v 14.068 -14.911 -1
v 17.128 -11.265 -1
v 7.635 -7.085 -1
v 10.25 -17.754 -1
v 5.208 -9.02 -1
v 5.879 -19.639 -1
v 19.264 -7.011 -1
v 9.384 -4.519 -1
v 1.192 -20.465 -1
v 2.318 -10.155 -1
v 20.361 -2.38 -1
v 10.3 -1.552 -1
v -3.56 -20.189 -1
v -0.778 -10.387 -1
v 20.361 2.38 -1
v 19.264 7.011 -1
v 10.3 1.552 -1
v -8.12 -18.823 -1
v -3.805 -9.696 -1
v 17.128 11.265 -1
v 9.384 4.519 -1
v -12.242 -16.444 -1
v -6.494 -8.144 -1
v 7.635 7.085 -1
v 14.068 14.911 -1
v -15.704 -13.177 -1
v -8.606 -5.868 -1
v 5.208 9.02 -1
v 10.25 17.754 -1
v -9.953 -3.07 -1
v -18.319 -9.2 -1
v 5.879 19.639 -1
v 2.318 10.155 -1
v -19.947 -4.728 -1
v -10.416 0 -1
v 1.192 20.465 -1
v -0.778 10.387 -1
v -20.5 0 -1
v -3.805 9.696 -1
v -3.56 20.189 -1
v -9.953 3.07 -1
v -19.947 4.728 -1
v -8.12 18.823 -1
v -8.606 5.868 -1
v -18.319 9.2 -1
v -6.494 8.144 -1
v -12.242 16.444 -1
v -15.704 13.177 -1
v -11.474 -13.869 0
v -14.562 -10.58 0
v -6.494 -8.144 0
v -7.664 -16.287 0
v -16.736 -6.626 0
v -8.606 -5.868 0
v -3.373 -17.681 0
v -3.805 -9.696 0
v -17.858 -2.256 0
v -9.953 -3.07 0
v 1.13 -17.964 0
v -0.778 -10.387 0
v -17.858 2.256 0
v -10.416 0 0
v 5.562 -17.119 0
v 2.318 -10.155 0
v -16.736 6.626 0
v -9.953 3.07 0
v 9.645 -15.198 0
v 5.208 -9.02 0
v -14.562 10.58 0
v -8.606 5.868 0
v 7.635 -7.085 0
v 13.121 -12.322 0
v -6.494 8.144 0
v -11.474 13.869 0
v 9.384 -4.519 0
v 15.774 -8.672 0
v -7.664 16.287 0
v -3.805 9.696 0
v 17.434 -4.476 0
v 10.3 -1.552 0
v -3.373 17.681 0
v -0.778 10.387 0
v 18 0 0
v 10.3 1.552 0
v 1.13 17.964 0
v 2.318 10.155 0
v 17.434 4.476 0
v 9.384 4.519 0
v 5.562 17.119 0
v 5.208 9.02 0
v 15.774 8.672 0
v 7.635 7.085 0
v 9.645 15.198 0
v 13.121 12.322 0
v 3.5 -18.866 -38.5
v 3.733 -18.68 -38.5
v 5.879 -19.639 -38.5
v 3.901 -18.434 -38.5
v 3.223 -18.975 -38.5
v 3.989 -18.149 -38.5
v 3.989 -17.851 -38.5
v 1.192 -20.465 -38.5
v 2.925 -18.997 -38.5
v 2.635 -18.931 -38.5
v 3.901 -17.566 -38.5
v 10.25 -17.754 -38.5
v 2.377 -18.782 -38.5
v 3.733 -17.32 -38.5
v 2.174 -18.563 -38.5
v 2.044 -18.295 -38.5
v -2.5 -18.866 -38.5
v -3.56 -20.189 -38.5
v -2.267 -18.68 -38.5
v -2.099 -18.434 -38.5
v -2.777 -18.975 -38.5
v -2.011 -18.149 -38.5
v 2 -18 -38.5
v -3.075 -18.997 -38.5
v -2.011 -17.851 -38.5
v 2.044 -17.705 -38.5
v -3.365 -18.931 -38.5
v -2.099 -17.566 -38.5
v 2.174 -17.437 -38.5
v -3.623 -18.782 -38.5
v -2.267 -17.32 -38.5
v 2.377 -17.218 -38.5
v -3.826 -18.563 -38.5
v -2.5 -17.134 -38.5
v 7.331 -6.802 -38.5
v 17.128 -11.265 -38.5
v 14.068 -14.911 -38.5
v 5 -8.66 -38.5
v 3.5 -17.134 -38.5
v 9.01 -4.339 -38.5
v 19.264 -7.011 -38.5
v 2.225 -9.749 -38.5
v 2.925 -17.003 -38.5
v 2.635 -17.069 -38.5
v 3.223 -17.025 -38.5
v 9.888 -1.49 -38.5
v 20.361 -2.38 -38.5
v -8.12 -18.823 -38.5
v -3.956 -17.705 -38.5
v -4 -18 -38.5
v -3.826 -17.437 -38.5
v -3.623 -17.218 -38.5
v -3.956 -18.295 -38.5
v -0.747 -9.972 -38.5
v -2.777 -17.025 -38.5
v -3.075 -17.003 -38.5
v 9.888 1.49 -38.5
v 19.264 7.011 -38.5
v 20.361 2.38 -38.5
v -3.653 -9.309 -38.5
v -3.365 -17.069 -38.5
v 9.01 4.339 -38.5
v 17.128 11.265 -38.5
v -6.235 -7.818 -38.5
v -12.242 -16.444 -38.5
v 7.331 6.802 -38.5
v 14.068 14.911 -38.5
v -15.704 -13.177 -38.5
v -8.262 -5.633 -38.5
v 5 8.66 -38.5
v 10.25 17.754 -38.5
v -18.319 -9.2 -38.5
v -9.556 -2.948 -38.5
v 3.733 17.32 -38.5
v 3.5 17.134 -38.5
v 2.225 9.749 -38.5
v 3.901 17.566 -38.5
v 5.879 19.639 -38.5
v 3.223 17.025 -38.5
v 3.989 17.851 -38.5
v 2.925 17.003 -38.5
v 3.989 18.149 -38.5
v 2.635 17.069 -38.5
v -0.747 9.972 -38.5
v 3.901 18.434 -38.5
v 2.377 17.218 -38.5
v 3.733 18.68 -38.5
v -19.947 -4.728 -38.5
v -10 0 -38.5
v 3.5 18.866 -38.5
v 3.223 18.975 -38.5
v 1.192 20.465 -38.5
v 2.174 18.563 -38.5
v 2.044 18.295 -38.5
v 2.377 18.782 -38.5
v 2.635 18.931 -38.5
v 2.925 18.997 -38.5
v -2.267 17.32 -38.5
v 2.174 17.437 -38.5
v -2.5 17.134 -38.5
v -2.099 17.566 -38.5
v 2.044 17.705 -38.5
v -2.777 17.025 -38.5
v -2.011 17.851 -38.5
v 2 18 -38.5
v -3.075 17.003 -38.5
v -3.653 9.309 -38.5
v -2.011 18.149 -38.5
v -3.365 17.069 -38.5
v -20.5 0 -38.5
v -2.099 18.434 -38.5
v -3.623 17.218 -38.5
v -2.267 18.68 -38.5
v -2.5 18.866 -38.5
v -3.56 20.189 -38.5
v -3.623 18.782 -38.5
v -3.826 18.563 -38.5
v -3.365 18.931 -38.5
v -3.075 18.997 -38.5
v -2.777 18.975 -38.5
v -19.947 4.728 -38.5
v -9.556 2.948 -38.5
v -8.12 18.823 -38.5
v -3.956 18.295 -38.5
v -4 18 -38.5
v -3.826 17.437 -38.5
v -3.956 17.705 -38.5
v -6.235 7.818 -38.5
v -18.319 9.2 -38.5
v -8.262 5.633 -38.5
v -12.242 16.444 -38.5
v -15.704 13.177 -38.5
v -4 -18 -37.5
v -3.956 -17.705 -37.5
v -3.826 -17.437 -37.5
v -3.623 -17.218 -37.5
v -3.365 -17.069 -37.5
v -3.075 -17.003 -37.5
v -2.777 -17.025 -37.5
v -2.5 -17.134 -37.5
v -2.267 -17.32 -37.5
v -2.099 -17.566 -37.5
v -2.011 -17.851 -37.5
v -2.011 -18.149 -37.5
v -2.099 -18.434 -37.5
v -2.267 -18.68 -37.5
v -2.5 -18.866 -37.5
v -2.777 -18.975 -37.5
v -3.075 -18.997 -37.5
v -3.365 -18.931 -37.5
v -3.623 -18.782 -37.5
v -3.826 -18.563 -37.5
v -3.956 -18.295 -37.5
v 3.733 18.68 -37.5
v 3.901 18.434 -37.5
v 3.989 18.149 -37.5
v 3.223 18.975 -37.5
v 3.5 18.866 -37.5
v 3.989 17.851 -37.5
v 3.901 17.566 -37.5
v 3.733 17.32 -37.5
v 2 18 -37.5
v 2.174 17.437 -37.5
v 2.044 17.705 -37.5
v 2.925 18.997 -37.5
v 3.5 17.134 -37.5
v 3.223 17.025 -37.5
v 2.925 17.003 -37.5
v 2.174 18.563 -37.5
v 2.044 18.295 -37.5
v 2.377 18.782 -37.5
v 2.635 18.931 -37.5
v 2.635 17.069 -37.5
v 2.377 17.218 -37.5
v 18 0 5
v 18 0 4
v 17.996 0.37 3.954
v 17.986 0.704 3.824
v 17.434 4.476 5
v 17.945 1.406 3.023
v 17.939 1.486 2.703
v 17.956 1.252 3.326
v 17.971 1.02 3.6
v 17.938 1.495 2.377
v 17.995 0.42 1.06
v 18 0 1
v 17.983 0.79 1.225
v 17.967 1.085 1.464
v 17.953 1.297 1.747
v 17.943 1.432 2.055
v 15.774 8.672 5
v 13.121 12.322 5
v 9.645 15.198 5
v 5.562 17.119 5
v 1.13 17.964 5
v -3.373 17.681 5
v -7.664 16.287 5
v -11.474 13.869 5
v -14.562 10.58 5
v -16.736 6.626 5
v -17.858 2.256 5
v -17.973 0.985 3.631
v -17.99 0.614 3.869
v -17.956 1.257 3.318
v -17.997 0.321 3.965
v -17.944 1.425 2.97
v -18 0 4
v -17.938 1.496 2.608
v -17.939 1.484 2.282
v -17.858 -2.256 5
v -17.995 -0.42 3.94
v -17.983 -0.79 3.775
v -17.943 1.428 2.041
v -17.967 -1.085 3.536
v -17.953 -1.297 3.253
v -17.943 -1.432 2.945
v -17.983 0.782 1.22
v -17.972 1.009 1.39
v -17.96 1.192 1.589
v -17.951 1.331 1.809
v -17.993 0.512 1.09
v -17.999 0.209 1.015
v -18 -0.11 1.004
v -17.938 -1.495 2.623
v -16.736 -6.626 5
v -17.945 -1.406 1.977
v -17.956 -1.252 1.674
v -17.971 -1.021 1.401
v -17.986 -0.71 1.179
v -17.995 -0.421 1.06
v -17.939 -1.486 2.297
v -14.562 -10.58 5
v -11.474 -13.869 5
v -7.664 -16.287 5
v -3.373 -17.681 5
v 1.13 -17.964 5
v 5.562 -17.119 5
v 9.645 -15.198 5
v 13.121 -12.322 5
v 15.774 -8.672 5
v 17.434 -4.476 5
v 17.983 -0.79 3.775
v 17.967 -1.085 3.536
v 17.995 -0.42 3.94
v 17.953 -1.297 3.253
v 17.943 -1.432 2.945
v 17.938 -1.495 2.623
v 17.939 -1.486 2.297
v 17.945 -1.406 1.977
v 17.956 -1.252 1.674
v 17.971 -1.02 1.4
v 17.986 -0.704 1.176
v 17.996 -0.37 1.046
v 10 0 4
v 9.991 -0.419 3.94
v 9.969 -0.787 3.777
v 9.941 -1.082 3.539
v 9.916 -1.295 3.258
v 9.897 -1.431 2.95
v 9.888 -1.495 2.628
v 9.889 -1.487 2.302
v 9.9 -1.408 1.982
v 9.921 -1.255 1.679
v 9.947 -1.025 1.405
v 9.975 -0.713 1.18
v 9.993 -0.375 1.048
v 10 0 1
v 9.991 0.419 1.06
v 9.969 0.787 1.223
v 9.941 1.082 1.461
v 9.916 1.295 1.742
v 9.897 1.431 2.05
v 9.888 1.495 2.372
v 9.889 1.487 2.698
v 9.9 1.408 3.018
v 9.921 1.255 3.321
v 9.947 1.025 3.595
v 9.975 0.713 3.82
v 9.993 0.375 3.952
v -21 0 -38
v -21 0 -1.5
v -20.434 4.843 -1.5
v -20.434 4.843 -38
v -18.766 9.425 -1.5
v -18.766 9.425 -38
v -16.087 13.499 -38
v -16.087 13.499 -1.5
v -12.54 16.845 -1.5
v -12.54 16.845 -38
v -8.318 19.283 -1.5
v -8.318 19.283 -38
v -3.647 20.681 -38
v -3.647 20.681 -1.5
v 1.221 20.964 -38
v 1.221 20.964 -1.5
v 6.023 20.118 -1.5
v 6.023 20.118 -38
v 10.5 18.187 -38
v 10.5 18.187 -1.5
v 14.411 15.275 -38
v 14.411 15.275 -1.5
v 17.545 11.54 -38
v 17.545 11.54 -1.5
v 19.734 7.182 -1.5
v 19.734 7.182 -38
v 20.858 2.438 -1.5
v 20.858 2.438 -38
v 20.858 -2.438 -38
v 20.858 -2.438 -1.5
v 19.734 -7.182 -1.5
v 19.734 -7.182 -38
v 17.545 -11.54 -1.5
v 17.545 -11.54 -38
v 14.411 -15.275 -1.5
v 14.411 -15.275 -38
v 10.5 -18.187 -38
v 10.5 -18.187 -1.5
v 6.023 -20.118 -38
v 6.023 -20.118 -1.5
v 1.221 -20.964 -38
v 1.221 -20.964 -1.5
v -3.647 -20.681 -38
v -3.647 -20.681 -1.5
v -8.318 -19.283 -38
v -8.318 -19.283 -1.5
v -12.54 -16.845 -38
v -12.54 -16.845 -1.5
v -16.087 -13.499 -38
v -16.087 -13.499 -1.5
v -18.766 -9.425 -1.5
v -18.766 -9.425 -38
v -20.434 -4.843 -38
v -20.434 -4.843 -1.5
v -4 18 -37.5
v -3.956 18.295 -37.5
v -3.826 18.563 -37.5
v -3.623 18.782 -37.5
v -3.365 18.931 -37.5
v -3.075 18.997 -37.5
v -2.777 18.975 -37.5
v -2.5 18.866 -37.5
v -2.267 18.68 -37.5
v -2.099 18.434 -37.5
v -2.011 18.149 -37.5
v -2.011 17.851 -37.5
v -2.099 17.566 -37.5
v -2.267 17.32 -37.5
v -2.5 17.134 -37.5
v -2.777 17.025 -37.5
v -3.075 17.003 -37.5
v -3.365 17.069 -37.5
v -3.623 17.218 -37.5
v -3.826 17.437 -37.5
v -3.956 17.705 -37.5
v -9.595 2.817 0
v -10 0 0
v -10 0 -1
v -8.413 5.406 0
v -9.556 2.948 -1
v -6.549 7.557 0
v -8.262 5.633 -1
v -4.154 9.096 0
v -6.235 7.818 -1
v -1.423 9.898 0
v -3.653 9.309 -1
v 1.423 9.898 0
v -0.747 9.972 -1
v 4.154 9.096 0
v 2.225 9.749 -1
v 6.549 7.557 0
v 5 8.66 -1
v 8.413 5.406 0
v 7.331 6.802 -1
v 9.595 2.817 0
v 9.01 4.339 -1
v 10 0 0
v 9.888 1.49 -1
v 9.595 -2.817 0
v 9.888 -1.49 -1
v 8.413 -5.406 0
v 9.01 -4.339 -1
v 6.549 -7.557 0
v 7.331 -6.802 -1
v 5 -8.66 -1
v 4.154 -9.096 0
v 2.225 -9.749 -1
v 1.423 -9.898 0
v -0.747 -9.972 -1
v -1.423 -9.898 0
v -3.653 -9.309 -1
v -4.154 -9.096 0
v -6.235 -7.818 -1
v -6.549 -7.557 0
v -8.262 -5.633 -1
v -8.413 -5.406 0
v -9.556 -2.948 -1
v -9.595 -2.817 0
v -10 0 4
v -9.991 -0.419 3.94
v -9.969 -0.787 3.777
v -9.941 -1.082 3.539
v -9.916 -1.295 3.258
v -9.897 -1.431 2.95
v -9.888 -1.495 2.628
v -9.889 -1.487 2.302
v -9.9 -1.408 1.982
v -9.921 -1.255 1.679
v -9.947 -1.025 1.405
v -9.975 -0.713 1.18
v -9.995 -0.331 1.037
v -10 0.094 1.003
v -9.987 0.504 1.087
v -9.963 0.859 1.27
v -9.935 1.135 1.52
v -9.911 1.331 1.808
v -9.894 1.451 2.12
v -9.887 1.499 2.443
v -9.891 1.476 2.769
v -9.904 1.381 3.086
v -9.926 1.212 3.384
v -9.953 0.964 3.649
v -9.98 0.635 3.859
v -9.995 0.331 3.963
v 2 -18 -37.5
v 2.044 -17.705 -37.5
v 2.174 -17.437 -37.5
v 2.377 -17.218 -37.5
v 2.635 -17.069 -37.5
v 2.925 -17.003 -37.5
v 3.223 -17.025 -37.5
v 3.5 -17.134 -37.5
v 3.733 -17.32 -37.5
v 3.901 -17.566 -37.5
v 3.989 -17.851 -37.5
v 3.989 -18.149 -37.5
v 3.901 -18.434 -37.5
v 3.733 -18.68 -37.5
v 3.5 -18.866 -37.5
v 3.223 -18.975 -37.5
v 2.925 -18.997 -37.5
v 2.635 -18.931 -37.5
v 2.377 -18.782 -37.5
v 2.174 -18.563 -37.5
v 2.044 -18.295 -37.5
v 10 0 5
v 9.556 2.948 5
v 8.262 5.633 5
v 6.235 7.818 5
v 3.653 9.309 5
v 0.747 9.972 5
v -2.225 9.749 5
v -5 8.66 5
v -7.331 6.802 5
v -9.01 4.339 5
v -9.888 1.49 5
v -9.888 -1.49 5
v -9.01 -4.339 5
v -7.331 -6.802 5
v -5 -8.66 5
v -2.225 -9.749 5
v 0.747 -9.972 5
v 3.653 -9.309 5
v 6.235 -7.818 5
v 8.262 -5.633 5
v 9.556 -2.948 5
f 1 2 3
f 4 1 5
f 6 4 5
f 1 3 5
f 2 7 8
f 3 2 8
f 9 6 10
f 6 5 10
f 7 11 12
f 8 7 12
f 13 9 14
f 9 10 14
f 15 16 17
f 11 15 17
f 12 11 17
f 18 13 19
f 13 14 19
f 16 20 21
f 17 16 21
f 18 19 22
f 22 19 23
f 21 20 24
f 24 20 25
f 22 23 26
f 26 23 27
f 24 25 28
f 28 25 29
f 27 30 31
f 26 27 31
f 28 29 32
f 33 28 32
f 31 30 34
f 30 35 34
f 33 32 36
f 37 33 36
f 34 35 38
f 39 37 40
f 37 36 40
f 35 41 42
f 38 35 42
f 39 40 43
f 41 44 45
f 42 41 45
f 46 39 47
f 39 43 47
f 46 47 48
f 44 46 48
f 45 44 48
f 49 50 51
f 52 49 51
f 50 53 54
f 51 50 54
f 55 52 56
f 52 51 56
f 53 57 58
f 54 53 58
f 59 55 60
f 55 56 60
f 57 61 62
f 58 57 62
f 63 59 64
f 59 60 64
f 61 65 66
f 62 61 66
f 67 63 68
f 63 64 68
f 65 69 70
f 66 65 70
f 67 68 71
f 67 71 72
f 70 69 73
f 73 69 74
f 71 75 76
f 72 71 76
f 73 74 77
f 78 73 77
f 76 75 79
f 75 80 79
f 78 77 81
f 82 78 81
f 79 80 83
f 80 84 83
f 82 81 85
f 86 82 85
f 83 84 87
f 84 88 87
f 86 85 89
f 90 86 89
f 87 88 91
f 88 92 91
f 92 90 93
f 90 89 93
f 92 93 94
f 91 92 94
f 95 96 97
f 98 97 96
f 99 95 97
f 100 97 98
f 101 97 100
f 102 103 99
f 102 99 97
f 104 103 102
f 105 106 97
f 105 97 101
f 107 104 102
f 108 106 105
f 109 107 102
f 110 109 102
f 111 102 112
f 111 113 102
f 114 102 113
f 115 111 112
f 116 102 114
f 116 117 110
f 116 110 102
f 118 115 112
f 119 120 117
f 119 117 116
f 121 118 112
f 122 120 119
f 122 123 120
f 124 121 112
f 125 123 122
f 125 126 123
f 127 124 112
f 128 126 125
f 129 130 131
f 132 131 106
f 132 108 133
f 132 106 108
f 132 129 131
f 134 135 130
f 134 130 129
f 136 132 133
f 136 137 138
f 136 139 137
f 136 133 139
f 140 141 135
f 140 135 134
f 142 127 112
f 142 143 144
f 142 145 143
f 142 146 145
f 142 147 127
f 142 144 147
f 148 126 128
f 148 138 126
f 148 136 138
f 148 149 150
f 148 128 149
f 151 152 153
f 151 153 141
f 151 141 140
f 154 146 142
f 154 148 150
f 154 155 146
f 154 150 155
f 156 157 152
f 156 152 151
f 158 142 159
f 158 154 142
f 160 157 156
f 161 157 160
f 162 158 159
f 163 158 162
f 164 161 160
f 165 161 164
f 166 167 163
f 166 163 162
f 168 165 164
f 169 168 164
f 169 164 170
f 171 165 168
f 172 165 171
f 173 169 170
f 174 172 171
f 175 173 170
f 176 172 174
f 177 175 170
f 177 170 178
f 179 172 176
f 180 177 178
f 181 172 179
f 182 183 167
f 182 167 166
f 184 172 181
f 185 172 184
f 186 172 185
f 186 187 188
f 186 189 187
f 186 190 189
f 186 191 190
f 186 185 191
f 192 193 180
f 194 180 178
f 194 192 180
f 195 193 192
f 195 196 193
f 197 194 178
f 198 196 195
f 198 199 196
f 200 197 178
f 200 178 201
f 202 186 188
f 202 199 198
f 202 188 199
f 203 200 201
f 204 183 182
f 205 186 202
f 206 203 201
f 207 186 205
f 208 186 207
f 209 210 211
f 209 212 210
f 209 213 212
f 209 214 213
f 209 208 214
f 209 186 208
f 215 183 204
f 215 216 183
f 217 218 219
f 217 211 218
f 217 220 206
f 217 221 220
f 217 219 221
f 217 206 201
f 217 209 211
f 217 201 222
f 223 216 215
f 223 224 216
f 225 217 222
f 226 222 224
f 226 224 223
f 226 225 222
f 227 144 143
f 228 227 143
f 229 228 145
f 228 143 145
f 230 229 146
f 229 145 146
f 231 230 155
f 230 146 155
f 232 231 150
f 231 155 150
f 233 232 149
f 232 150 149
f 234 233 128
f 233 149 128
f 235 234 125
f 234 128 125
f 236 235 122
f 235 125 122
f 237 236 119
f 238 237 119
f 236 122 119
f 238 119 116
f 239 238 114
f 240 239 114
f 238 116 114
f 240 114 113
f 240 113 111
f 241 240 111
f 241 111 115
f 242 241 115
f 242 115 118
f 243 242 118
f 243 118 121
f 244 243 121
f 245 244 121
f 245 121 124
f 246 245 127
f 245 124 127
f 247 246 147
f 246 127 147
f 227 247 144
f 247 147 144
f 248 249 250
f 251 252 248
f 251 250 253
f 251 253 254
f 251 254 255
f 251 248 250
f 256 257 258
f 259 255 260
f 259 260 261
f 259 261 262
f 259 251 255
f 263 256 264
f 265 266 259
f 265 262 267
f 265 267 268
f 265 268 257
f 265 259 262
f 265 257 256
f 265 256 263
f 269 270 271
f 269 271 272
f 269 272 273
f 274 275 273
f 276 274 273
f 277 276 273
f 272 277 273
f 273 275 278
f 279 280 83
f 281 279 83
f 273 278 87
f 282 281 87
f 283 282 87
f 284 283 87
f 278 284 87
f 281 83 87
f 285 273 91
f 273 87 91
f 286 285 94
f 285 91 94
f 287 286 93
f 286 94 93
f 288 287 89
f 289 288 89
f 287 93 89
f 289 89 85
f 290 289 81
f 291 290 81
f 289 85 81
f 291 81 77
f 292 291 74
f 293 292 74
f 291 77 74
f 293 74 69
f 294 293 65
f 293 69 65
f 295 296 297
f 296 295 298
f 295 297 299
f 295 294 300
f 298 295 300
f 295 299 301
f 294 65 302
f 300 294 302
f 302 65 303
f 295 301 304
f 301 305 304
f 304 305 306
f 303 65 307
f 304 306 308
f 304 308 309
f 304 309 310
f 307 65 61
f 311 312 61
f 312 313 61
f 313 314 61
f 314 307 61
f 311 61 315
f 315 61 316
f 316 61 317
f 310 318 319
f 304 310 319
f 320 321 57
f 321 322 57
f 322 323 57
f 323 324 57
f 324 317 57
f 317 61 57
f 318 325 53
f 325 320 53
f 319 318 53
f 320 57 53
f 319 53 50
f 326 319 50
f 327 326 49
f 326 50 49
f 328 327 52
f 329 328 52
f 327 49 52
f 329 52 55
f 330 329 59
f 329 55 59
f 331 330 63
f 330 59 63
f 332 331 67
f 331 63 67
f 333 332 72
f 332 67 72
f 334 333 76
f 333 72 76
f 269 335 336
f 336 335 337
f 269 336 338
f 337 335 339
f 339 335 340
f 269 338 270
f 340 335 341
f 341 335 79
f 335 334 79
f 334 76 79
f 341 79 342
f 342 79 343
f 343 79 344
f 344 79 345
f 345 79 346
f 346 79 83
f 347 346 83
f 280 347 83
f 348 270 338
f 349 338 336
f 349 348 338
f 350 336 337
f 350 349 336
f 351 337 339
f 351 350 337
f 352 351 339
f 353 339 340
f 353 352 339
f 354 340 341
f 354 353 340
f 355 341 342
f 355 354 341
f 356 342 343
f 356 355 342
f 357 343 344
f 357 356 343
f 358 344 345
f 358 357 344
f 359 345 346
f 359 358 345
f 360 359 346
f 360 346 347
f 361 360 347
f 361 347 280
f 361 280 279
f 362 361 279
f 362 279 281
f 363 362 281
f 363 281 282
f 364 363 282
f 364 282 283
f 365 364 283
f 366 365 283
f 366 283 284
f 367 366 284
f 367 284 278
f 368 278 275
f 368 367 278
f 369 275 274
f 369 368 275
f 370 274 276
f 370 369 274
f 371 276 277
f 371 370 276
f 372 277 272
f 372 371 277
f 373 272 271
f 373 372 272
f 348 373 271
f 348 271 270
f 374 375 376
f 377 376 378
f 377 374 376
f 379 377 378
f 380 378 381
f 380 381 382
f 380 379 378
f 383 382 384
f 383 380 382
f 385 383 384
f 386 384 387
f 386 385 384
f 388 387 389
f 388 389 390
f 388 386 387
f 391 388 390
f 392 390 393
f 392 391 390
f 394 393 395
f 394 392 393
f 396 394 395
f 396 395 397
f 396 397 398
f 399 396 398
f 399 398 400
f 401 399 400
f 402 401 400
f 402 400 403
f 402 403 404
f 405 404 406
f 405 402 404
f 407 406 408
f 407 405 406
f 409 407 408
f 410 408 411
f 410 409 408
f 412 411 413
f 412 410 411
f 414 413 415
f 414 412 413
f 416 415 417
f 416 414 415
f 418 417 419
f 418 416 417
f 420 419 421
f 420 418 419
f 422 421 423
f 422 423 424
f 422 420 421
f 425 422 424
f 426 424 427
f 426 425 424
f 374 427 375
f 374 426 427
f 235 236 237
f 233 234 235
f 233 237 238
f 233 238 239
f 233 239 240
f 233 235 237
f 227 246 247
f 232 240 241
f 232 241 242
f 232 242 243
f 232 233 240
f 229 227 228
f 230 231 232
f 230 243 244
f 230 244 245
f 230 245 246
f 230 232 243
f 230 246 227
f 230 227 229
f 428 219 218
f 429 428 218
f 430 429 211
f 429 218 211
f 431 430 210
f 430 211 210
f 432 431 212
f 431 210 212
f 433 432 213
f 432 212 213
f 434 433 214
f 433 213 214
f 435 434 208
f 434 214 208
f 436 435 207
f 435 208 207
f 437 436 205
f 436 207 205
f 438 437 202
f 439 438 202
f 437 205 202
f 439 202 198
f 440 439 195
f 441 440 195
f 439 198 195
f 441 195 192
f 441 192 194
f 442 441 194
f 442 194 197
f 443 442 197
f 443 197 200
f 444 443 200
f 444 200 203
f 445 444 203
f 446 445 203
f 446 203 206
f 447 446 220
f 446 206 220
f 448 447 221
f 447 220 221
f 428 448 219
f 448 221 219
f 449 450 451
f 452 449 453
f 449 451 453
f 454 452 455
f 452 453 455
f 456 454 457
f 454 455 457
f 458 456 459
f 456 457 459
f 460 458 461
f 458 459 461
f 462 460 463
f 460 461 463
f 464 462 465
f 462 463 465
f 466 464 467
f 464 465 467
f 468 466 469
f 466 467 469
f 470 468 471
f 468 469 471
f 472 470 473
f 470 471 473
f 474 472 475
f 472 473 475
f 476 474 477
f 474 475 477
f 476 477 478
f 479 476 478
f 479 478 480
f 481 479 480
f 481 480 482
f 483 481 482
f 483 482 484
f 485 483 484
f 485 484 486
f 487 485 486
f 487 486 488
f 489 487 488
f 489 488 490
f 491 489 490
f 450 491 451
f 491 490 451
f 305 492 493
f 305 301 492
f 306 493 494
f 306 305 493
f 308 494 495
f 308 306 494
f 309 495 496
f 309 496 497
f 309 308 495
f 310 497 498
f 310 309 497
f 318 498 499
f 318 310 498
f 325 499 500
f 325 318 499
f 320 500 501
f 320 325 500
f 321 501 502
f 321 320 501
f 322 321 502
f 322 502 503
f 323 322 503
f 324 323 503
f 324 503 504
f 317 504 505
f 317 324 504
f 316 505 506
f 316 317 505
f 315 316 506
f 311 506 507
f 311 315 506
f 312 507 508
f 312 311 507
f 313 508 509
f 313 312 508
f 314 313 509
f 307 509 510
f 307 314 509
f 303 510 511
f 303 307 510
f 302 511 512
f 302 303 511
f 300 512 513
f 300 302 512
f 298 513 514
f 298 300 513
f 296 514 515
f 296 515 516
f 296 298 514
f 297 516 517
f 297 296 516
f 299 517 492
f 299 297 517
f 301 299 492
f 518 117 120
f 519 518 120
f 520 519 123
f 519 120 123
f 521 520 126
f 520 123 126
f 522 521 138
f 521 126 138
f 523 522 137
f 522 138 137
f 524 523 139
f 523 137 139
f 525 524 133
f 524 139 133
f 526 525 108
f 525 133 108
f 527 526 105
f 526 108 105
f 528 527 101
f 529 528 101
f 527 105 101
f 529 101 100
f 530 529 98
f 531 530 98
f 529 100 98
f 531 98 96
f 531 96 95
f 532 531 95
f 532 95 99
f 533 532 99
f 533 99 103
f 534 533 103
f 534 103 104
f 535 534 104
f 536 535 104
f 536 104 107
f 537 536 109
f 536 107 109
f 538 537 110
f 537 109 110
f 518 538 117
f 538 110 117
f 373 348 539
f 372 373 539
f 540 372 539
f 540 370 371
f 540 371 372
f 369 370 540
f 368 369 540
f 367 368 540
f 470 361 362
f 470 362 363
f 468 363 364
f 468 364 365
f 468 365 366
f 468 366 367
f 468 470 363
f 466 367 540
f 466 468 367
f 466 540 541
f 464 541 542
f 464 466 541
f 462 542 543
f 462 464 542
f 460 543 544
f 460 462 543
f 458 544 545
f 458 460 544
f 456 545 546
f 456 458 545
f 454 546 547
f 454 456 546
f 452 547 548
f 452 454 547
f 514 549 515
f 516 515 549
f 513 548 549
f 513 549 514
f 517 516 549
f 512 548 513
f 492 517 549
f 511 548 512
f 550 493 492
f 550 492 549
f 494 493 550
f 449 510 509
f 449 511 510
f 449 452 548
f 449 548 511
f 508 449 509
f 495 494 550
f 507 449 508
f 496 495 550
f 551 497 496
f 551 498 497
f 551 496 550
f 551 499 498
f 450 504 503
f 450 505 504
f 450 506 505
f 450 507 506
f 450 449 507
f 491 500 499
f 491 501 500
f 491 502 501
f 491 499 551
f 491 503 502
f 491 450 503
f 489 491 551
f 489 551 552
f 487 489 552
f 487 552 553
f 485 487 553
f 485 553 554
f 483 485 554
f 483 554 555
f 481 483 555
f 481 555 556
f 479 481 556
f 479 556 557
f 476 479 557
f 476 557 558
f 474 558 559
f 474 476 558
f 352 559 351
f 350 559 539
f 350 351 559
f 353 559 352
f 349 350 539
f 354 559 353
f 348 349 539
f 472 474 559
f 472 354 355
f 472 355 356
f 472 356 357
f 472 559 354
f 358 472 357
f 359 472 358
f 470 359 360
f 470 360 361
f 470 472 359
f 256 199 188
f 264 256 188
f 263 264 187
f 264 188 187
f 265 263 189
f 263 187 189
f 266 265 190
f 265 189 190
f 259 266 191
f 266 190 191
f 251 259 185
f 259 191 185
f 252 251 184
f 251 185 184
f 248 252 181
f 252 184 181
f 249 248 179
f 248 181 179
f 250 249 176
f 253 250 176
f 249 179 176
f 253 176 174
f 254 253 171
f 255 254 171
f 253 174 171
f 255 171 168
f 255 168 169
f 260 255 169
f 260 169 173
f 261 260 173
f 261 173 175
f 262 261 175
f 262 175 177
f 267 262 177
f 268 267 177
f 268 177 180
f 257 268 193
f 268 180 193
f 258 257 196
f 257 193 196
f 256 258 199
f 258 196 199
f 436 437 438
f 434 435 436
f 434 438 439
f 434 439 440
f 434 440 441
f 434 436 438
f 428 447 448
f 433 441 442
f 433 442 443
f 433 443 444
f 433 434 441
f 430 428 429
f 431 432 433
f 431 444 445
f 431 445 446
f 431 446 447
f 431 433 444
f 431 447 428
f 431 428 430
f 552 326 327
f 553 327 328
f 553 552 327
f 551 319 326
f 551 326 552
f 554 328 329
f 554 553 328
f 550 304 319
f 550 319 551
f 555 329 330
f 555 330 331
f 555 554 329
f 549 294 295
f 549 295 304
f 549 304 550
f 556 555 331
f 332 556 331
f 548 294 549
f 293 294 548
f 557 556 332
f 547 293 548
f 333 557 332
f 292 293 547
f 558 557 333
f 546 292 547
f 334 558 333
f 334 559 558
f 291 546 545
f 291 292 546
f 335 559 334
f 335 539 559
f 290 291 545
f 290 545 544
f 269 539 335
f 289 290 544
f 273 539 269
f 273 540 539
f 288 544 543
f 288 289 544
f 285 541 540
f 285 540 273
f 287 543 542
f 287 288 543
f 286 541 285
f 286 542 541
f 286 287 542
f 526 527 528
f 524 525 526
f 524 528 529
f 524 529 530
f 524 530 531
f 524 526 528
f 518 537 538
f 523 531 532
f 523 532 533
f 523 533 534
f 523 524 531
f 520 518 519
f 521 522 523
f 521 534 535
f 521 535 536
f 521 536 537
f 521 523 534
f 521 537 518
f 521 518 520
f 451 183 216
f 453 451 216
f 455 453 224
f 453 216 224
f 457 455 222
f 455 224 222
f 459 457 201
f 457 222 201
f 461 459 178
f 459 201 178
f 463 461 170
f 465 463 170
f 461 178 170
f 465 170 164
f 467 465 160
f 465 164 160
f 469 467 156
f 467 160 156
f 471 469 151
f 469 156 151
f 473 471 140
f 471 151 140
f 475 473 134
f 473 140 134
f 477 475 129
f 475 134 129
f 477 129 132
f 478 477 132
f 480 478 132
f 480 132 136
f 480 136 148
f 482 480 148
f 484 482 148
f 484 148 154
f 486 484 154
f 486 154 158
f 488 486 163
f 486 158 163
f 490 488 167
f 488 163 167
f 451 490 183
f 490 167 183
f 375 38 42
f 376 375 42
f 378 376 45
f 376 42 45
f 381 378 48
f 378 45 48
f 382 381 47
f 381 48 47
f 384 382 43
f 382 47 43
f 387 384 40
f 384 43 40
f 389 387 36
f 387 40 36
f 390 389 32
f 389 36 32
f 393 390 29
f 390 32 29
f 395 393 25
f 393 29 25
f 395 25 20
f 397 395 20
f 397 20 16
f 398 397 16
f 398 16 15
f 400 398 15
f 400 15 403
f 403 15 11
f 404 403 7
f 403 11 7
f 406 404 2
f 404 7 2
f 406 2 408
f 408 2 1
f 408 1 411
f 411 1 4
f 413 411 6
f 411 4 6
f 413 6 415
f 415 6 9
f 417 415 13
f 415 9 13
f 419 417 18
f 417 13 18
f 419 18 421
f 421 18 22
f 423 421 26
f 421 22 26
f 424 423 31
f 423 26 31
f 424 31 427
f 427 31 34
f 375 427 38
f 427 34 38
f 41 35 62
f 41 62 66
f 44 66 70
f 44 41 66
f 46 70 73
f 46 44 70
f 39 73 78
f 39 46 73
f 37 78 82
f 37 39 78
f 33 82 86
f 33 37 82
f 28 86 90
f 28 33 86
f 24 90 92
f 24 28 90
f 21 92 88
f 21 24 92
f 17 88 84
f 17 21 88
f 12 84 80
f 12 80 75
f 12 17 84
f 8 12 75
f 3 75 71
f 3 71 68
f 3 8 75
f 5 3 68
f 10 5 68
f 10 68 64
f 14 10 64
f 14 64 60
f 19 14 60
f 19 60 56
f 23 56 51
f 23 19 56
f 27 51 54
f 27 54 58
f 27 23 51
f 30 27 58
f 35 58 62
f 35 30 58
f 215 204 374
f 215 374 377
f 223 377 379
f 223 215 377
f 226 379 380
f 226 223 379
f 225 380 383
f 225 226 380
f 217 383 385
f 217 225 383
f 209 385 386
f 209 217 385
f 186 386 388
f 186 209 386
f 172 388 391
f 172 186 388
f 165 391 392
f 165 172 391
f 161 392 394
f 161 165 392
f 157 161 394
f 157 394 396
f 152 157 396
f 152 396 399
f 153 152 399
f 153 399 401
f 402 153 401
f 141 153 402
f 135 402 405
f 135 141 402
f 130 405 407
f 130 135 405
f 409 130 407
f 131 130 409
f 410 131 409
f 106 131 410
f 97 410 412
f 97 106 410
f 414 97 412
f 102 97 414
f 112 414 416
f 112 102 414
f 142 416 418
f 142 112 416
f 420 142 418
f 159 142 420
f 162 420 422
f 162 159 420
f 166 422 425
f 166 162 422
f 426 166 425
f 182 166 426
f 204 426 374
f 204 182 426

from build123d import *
from build123d.topology import SkipClean

# Parameters (mm, degrees)
SKETCH_1_R               = 18
SKETCH_1_R_2             = 10
EXTRUDE_1_DEPTH          = 5
CUT_EXTRUDE_1_DEPTH      = 35
CUT_EXTRUDE_1_DEPTH_BACK = 19
SKETCH_2_R               = 1.5
EXTRUDE_START            = 1
SKETCH_3_R               = 10.41594451
SKETCH_3_R_2             = 10
EXTRUDE_2_DEPTH          = 1
EXTRUDE_START_2          = 37.5
SKETCH_4_R               = 21
SKETCH_4_R_2             = 10
EXTRUDE_3_DEPTH          = 37.5
CHAMFER_1_SIZE           = 0.5
SKETCH_5_R               = 1
CUT_EXTRUDE_2_DEPTH      = 1


with BuildPart() as part:
    # 草图1 → 凸台-拉伸1 (new body)
    with BuildSketch(Plane.XY):
        Circle(SKETCH_1_R)
        Circle(SKETCH_1_R_2, mode=Mode.SUBTRACT)
    extrude(amount=EXTRUDE_1_DEPTH)

    # 草图2 → 切除-拉伸1 (cut, two sides: drawn at the far end of the back side and taken through both)
    with BuildSketch(Plane(origin=(0, 0, 0), x_dir=(0, 0, -1), z_dir=(1, 0, 0)).offset(-CUT_EXTRUDE_1_DEPTH_BACK)):
        with Locations(Location((-2.5, 0, 0), (0, 0, 180))):
            Circle(SKETCH_2_R)
    extrude(amount=CUT_EXTRUDE_1_DEPTH + CUT_EXTRUDE_1_DEPTH_BACK, mode=Mode.SUBTRACT)

    # 草图3 → 凸台-拉伸2 (add)
    with SkipClean():  # the faces are left unmerged after this step: merging them gives an invalid solid
        with BuildSketch(Plane(origin=(0, 0, 0), x_dir=(-1, 0, 0), z_dir=(0, 0, -1)).offset(EXTRUDE_START)):
            Circle(SKETCH_3_R)
            Circle(SKETCH_3_R_2, mode=Mode.SUBTRACT)
        extrude(amount=-EXTRUDE_2_DEPTH)

    # 草图4 → 凸台-拉伸3 (add)
    with SkipClean():  # the faces are left unmerged after this step: merging them gives an invalid solid
        with BuildSketch(Plane(origin=(0, 0, -1), x_dir=(-1, 0, 0), z_dir=(0, 0, -1)).offset(EXTRUDE_START_2)):
            Circle(SKETCH_4_R)
            Circle(SKETCH_4_R_2, mode=Mode.SUBTRACT)
        extrude(amount=-EXTRUDE_3_DEPTH)

    # 倒角1
    chamfer_1_edges = [part.edges().sort_by_distance(p)[0] for p in [
        (21, 0, -38.5),
        (21, 0, -1),
    ]]
    chamfer(chamfer_1_edges, length=CHAMFER_1_SIZE)

    # 草图5 → 切除-拉伸2 (cut)
    with BuildSketch(Plane(origin=(0, 0, -38.5), x_dir=(-1, 0, 0), z_dir=(0, 0, -1))):
        with Locations((3, -18)):
            Circle(SKETCH_5_R)
        with Locations((-3, -18)):
            Circle(SKETCH_5_R)
        with Locations((-3, 18)):
            Circle(SKETCH_5_R)
        with Locations((3, 18)):
            Circle(SKETCH_5_R)
    extrude(amount=-CUT_EXTRUDE_2_DEPTH, mode=Mode.SUBTRACT)


solid = part.part
